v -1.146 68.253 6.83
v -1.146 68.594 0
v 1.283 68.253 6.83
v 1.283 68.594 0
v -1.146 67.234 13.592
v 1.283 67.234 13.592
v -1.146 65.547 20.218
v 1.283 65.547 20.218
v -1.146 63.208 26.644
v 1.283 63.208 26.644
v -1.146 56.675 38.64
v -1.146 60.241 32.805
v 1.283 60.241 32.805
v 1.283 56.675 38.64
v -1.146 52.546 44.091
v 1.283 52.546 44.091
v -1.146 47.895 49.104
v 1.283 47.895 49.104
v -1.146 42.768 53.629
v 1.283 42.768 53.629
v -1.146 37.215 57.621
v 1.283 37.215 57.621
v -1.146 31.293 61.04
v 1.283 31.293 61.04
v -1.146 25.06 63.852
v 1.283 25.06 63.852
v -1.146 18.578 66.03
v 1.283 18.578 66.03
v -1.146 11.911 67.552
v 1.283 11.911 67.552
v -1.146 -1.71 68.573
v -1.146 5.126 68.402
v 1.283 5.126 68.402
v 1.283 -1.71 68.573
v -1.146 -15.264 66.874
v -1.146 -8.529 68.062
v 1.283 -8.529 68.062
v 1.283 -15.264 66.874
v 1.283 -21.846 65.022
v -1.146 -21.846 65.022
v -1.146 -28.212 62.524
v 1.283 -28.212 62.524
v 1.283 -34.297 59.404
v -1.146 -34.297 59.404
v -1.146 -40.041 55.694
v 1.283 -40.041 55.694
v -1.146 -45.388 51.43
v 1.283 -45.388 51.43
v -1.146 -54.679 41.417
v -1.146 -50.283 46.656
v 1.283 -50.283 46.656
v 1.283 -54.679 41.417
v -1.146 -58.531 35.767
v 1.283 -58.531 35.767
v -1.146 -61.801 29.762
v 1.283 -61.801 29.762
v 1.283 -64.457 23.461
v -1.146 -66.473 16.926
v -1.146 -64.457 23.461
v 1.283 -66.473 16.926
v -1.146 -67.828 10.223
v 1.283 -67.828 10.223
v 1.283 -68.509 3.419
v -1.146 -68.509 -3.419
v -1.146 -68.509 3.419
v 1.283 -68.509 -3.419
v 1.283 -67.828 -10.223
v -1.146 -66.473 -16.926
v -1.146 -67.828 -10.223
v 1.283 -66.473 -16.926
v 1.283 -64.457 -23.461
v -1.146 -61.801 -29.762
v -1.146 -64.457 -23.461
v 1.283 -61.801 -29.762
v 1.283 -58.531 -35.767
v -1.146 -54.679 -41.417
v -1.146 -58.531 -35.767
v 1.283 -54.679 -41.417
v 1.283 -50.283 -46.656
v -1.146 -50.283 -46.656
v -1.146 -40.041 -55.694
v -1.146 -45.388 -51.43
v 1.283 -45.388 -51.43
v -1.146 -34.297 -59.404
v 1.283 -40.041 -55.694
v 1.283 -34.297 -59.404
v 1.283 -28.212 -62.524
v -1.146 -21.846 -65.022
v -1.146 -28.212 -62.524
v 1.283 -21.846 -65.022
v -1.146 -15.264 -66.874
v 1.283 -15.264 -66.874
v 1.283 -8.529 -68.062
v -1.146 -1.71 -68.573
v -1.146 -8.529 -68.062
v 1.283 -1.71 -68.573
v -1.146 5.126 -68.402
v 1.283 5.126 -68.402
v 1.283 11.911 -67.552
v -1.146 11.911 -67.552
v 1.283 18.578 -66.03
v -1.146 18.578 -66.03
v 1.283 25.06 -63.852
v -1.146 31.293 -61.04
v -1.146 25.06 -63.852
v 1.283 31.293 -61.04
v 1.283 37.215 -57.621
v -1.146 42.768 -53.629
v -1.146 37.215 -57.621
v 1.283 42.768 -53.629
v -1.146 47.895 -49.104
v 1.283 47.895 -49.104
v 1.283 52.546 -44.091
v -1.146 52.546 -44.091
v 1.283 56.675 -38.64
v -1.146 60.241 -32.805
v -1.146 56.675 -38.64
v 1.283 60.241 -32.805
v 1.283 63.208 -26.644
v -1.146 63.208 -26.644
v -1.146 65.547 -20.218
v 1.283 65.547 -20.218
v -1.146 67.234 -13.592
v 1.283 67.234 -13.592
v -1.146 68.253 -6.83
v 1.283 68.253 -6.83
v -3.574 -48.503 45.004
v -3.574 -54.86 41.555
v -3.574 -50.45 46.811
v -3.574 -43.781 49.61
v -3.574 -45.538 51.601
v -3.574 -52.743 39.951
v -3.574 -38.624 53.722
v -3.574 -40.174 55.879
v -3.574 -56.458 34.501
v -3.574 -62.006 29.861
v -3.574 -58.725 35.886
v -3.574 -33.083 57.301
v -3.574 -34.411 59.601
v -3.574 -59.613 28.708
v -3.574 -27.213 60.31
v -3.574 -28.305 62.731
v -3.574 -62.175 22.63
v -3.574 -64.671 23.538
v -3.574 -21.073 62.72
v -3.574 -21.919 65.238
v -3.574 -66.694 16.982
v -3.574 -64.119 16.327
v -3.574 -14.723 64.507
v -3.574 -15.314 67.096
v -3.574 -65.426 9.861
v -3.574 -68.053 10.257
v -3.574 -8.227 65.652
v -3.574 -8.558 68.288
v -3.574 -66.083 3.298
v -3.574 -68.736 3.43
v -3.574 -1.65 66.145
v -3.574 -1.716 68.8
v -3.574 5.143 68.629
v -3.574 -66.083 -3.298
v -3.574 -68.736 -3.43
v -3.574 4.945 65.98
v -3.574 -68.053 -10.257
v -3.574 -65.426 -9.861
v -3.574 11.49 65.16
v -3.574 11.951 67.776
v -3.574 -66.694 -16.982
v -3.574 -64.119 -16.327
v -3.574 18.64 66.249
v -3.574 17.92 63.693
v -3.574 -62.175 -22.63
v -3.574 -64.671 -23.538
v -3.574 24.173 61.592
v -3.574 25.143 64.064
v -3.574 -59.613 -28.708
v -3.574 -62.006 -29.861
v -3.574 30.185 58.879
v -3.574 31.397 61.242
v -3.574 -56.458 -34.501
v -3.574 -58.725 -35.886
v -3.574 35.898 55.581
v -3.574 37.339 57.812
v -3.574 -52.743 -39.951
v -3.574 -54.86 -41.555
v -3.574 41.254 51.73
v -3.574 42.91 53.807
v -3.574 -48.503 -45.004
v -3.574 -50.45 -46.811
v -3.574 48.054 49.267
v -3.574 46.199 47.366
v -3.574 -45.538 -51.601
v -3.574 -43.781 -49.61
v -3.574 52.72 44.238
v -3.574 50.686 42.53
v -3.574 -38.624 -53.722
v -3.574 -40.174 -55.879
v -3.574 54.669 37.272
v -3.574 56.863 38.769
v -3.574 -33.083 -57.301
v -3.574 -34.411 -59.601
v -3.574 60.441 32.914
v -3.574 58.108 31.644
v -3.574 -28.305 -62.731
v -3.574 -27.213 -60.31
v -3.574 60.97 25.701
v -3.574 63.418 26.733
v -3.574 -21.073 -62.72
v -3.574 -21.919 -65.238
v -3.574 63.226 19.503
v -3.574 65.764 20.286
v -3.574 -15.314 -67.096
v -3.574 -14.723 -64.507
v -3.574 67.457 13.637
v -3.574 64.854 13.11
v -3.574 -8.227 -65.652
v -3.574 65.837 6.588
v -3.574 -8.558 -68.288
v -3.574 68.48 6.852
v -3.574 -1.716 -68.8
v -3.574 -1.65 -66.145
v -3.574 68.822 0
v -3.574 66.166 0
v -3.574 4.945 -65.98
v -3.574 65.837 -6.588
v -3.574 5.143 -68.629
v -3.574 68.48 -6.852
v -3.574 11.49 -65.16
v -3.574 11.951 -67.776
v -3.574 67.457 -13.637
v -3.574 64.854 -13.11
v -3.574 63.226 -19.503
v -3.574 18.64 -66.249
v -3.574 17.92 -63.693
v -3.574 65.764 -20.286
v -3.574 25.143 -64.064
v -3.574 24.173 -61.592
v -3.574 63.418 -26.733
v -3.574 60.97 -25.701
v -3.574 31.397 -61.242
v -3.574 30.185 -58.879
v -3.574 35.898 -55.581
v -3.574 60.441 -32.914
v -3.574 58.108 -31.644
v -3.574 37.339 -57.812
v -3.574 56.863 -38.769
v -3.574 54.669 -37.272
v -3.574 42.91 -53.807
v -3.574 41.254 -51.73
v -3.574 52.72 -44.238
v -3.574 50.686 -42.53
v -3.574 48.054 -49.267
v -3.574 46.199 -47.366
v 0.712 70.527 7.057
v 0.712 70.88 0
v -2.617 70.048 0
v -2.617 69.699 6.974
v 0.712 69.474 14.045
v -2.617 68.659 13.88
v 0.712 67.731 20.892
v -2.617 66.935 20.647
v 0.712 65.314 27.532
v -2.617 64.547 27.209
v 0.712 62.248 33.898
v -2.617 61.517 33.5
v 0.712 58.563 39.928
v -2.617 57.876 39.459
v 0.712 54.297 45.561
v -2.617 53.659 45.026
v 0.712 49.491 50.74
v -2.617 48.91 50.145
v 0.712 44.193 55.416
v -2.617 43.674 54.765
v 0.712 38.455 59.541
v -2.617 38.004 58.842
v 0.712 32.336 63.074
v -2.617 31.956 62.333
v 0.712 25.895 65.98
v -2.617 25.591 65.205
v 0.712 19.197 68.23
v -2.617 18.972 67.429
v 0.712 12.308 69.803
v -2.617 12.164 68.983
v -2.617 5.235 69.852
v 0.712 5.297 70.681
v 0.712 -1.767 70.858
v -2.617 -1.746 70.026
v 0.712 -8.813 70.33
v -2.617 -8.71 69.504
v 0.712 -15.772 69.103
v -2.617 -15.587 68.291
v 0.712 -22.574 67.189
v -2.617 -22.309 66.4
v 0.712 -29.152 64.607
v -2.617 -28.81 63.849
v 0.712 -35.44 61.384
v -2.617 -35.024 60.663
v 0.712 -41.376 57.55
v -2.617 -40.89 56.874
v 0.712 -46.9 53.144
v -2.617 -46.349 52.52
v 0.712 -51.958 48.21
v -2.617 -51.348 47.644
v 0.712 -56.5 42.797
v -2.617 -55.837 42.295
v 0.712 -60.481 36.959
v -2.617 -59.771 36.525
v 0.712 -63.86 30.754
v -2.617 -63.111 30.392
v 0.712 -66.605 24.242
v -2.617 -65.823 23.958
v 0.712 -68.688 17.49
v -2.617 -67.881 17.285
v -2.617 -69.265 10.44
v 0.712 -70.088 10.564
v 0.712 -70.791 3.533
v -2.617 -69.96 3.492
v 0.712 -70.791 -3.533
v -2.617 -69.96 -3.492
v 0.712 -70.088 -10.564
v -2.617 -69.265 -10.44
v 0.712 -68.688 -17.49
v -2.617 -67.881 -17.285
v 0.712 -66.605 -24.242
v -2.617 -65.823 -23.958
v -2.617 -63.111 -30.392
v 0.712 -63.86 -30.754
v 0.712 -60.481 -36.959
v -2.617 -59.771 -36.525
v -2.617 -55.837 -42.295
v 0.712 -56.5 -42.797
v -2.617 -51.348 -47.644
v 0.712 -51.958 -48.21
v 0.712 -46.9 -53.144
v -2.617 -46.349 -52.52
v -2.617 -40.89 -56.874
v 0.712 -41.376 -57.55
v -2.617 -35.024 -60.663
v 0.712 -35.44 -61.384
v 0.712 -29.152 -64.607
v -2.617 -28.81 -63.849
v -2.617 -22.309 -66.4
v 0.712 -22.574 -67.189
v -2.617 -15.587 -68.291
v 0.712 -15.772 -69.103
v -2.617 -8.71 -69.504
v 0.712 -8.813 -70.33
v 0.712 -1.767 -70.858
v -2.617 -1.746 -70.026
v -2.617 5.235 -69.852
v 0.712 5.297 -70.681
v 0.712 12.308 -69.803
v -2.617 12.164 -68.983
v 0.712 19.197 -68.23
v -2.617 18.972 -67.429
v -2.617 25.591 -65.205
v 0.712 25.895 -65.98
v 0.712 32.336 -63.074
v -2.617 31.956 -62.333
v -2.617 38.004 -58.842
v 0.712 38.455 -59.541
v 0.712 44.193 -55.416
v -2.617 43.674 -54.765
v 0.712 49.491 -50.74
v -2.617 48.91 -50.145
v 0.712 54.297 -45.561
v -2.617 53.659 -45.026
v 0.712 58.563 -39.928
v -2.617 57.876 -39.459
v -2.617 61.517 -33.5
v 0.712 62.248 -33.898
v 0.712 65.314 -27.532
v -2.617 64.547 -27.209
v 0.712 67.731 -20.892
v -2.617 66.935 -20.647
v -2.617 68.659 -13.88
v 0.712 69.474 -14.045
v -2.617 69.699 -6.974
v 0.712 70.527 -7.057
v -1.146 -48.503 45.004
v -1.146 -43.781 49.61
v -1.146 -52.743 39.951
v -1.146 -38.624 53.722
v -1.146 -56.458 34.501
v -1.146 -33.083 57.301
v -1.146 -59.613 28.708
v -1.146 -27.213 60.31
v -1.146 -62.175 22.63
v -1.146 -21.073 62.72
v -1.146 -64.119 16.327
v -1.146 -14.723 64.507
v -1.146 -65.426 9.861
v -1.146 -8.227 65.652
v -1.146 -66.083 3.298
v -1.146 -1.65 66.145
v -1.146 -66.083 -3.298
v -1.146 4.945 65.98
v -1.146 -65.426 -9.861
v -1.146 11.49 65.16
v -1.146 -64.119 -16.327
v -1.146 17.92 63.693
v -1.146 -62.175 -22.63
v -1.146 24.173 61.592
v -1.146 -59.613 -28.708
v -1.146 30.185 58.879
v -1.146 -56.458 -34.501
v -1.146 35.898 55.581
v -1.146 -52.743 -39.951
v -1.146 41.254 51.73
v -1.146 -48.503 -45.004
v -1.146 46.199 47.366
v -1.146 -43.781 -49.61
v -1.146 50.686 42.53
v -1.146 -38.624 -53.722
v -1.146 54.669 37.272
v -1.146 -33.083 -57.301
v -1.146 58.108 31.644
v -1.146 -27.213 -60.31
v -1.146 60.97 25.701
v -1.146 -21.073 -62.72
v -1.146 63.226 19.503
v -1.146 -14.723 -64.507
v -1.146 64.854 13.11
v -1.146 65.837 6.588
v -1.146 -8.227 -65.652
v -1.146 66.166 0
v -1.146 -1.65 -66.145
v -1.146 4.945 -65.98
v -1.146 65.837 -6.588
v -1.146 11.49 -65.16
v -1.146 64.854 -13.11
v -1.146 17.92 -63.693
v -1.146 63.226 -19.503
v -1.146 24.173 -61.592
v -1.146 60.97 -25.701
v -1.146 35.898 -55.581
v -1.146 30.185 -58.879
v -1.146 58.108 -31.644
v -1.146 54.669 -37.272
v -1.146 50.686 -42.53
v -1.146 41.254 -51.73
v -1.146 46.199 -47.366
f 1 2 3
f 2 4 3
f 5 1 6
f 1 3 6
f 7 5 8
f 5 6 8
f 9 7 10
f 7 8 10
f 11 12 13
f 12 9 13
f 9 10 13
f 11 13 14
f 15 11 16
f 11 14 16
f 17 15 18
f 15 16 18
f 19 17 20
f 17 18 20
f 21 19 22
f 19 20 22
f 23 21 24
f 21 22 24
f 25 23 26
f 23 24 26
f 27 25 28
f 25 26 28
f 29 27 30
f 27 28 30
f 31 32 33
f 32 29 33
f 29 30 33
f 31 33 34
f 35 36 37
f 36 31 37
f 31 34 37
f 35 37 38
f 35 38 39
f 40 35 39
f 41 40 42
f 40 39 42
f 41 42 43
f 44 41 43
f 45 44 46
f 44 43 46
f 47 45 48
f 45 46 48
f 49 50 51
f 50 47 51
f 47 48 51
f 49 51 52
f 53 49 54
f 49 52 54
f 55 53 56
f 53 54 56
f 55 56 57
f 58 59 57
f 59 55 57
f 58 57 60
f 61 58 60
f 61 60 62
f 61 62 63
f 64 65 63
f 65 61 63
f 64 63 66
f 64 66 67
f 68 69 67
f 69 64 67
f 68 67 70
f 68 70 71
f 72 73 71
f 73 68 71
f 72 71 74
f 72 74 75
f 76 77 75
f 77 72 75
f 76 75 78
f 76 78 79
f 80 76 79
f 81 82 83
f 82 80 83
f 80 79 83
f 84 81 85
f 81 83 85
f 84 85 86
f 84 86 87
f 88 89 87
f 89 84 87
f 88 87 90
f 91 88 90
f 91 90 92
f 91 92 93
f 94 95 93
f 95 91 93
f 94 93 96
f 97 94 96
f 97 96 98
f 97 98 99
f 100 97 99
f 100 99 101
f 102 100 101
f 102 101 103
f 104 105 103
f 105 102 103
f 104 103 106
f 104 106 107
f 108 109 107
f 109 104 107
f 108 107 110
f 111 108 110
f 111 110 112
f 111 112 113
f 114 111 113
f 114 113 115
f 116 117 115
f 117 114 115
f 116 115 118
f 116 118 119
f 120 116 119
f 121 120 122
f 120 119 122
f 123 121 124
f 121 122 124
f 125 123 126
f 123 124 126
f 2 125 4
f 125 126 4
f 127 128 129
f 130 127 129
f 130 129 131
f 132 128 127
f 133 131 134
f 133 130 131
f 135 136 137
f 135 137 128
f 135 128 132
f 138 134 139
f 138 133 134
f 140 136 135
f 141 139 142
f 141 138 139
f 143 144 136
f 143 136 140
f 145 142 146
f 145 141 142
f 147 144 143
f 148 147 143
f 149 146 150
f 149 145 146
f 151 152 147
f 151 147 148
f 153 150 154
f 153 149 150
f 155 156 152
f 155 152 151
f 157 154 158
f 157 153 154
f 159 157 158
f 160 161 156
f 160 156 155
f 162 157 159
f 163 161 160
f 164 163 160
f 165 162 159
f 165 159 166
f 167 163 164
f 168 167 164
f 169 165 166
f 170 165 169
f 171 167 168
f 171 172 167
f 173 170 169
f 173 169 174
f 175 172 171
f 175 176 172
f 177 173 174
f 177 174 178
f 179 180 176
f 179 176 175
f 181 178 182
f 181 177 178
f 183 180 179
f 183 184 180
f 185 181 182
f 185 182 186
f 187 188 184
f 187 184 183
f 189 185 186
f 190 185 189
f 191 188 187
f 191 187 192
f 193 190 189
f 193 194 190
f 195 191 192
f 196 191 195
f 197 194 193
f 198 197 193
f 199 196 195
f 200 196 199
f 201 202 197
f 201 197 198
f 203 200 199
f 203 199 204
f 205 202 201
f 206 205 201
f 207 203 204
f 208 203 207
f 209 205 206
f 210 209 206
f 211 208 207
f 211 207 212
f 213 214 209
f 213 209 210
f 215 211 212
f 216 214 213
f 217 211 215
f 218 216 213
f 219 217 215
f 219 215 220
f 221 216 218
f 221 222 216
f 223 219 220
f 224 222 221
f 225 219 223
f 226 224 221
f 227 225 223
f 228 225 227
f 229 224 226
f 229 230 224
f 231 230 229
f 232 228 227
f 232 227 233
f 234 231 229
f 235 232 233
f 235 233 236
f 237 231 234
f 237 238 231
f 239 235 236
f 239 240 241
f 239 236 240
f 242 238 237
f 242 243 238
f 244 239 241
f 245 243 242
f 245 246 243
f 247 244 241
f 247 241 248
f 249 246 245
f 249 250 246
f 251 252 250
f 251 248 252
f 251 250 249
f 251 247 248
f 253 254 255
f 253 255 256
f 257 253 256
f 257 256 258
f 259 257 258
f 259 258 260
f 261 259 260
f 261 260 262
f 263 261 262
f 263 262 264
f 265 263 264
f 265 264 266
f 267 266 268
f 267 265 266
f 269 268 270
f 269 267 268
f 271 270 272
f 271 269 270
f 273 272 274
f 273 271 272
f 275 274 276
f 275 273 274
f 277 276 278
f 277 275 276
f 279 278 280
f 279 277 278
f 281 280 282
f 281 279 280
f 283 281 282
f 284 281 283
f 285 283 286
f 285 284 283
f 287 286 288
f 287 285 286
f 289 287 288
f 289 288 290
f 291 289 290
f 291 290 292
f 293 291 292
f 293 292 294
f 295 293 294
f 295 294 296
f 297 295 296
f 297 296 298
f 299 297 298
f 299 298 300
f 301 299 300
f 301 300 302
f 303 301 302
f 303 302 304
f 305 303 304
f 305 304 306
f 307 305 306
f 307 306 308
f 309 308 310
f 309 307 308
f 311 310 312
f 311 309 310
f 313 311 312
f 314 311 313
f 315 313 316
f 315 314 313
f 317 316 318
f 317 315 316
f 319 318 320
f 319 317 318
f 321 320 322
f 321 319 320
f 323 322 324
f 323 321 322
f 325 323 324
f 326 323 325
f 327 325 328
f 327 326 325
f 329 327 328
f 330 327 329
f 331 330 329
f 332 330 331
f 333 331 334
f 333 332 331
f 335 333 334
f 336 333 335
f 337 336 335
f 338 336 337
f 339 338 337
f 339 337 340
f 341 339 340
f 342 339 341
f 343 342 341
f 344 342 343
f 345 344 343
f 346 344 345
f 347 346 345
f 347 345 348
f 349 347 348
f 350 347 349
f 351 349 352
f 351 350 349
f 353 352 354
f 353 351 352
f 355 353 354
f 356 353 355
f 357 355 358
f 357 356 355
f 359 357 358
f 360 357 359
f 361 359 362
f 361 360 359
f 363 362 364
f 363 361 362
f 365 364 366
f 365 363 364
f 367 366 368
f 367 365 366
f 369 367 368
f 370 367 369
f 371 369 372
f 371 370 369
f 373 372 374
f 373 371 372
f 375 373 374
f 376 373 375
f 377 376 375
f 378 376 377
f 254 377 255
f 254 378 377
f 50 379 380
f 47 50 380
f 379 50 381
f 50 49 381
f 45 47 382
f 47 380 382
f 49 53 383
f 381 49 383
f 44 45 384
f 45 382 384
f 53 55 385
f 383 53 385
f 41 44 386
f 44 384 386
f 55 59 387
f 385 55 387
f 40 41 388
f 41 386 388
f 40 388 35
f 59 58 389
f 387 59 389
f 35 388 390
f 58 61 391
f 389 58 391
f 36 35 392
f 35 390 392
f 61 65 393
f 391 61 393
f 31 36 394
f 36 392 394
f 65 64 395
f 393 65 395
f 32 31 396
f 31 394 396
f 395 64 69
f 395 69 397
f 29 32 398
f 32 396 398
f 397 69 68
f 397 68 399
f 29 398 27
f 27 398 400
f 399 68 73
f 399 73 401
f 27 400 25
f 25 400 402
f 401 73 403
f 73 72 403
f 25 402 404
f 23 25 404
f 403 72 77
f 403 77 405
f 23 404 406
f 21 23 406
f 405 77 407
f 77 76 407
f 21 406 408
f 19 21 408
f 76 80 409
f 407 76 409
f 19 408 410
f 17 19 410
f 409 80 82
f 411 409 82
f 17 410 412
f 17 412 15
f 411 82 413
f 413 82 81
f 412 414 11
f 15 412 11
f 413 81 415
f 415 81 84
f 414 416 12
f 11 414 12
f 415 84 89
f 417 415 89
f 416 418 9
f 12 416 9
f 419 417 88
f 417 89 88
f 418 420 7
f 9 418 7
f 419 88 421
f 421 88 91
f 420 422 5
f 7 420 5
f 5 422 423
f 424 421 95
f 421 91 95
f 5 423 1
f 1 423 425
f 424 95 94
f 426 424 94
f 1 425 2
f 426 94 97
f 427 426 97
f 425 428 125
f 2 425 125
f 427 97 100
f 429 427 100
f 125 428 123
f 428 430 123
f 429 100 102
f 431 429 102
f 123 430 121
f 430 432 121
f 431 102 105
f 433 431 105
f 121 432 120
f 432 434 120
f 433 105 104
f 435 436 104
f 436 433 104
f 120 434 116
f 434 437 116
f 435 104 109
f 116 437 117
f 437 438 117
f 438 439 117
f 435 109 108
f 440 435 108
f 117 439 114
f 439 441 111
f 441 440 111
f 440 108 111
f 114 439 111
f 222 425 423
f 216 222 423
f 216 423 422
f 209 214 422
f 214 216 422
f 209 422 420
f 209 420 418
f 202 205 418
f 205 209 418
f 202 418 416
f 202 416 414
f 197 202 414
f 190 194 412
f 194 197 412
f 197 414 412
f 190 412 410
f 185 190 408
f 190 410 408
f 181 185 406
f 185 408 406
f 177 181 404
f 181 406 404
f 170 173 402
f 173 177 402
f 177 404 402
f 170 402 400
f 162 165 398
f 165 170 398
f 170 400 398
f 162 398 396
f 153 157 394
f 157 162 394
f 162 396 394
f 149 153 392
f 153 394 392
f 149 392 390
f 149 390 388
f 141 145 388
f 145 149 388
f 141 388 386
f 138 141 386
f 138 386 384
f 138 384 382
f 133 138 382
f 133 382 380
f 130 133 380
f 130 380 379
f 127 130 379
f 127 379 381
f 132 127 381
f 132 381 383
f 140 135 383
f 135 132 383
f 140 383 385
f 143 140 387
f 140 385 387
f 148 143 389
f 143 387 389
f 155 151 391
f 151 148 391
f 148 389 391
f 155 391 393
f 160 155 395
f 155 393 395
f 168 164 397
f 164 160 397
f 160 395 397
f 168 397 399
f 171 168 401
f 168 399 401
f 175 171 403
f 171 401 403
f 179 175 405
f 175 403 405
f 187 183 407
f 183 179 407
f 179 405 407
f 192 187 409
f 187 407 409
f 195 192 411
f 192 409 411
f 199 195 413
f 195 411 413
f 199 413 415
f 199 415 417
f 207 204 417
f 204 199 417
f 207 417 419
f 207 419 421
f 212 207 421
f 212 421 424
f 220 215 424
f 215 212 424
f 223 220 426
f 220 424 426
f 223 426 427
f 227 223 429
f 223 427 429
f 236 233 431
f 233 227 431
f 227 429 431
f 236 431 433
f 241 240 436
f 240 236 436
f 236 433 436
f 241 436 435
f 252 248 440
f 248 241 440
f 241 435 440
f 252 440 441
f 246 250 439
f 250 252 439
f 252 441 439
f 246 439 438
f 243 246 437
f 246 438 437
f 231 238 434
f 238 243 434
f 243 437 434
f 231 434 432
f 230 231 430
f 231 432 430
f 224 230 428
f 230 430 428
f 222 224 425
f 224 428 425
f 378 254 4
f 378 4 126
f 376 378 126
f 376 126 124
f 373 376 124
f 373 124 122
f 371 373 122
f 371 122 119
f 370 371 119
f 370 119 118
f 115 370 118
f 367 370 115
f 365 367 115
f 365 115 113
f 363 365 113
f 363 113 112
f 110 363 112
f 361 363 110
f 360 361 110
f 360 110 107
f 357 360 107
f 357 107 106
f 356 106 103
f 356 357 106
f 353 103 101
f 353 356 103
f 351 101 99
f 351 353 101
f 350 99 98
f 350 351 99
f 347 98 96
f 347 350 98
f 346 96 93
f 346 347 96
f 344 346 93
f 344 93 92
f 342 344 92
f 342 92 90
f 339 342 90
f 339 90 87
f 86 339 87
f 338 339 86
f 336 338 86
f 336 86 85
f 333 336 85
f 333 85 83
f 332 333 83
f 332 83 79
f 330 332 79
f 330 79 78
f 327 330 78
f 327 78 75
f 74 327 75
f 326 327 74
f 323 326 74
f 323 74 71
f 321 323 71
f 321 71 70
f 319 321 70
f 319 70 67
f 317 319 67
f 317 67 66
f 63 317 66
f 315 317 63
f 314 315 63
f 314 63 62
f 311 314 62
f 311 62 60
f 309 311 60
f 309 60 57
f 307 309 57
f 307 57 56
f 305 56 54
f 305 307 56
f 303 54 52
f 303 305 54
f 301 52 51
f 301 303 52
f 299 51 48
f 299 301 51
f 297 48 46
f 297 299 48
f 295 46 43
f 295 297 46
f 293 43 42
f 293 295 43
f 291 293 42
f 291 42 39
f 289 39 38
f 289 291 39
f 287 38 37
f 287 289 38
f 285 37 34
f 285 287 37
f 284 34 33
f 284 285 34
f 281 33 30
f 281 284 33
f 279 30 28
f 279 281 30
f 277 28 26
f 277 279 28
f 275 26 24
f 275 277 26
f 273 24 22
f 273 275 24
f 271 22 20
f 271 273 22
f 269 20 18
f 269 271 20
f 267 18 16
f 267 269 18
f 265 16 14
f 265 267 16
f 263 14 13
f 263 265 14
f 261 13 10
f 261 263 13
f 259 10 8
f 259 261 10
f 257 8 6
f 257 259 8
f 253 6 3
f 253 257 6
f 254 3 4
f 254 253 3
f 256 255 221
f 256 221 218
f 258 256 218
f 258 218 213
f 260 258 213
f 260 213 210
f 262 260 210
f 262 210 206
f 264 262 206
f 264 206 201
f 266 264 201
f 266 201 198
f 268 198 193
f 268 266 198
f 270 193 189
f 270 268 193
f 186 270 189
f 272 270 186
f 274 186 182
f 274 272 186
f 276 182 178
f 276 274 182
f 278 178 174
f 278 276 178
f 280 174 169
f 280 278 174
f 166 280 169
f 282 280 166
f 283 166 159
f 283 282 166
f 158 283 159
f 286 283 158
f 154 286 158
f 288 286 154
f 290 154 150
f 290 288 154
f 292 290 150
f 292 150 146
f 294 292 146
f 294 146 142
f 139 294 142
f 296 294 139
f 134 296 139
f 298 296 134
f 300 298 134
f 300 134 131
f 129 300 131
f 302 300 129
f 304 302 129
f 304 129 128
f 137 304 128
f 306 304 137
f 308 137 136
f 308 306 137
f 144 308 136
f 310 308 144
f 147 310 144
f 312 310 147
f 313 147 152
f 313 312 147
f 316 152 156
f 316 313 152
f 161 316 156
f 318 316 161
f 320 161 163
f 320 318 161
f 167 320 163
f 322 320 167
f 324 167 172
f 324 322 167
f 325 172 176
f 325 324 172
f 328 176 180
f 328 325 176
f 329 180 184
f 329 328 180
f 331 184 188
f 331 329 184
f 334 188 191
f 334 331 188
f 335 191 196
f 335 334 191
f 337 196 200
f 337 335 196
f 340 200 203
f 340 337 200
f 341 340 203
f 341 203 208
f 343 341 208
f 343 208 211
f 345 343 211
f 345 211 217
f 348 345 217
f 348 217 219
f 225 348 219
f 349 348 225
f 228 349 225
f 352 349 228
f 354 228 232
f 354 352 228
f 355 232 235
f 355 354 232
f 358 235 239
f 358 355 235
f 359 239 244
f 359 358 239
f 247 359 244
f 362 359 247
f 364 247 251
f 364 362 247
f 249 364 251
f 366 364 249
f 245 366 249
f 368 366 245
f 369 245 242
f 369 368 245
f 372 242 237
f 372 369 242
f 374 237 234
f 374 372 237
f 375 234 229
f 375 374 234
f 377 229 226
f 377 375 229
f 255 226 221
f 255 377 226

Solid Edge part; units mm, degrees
sketch "Sketch1" plane through (0, 0, 0) normal (0, 0, 1) x (1, 0, 0)
  line L0 (-3.574, 68.8217) -> (-3.574, 66.1655)
  line L1 (-3.574, 66.1655) -> (-1.1455, 66.1655)
  line L2 (-1.1455, 66.1655) -> (-1.1455, 68.594)
  line L3 (-1.1455, 68.594) -> (1.283, 68.594)
  line L4 (1.283, 68.594) -> (0.7116, 70.8796)
  line L5 (0.7116, 70.8796) -> (-2.6169, 70.0475)
  line L6 (-2.6169, 70.0475) -> (-3.574, 68.8217)
revolve "RevolvedProtrusion1" add sketch "Sketch1" angle 360 about axis through (50, 0, 0) along (-1, 0, 0)
